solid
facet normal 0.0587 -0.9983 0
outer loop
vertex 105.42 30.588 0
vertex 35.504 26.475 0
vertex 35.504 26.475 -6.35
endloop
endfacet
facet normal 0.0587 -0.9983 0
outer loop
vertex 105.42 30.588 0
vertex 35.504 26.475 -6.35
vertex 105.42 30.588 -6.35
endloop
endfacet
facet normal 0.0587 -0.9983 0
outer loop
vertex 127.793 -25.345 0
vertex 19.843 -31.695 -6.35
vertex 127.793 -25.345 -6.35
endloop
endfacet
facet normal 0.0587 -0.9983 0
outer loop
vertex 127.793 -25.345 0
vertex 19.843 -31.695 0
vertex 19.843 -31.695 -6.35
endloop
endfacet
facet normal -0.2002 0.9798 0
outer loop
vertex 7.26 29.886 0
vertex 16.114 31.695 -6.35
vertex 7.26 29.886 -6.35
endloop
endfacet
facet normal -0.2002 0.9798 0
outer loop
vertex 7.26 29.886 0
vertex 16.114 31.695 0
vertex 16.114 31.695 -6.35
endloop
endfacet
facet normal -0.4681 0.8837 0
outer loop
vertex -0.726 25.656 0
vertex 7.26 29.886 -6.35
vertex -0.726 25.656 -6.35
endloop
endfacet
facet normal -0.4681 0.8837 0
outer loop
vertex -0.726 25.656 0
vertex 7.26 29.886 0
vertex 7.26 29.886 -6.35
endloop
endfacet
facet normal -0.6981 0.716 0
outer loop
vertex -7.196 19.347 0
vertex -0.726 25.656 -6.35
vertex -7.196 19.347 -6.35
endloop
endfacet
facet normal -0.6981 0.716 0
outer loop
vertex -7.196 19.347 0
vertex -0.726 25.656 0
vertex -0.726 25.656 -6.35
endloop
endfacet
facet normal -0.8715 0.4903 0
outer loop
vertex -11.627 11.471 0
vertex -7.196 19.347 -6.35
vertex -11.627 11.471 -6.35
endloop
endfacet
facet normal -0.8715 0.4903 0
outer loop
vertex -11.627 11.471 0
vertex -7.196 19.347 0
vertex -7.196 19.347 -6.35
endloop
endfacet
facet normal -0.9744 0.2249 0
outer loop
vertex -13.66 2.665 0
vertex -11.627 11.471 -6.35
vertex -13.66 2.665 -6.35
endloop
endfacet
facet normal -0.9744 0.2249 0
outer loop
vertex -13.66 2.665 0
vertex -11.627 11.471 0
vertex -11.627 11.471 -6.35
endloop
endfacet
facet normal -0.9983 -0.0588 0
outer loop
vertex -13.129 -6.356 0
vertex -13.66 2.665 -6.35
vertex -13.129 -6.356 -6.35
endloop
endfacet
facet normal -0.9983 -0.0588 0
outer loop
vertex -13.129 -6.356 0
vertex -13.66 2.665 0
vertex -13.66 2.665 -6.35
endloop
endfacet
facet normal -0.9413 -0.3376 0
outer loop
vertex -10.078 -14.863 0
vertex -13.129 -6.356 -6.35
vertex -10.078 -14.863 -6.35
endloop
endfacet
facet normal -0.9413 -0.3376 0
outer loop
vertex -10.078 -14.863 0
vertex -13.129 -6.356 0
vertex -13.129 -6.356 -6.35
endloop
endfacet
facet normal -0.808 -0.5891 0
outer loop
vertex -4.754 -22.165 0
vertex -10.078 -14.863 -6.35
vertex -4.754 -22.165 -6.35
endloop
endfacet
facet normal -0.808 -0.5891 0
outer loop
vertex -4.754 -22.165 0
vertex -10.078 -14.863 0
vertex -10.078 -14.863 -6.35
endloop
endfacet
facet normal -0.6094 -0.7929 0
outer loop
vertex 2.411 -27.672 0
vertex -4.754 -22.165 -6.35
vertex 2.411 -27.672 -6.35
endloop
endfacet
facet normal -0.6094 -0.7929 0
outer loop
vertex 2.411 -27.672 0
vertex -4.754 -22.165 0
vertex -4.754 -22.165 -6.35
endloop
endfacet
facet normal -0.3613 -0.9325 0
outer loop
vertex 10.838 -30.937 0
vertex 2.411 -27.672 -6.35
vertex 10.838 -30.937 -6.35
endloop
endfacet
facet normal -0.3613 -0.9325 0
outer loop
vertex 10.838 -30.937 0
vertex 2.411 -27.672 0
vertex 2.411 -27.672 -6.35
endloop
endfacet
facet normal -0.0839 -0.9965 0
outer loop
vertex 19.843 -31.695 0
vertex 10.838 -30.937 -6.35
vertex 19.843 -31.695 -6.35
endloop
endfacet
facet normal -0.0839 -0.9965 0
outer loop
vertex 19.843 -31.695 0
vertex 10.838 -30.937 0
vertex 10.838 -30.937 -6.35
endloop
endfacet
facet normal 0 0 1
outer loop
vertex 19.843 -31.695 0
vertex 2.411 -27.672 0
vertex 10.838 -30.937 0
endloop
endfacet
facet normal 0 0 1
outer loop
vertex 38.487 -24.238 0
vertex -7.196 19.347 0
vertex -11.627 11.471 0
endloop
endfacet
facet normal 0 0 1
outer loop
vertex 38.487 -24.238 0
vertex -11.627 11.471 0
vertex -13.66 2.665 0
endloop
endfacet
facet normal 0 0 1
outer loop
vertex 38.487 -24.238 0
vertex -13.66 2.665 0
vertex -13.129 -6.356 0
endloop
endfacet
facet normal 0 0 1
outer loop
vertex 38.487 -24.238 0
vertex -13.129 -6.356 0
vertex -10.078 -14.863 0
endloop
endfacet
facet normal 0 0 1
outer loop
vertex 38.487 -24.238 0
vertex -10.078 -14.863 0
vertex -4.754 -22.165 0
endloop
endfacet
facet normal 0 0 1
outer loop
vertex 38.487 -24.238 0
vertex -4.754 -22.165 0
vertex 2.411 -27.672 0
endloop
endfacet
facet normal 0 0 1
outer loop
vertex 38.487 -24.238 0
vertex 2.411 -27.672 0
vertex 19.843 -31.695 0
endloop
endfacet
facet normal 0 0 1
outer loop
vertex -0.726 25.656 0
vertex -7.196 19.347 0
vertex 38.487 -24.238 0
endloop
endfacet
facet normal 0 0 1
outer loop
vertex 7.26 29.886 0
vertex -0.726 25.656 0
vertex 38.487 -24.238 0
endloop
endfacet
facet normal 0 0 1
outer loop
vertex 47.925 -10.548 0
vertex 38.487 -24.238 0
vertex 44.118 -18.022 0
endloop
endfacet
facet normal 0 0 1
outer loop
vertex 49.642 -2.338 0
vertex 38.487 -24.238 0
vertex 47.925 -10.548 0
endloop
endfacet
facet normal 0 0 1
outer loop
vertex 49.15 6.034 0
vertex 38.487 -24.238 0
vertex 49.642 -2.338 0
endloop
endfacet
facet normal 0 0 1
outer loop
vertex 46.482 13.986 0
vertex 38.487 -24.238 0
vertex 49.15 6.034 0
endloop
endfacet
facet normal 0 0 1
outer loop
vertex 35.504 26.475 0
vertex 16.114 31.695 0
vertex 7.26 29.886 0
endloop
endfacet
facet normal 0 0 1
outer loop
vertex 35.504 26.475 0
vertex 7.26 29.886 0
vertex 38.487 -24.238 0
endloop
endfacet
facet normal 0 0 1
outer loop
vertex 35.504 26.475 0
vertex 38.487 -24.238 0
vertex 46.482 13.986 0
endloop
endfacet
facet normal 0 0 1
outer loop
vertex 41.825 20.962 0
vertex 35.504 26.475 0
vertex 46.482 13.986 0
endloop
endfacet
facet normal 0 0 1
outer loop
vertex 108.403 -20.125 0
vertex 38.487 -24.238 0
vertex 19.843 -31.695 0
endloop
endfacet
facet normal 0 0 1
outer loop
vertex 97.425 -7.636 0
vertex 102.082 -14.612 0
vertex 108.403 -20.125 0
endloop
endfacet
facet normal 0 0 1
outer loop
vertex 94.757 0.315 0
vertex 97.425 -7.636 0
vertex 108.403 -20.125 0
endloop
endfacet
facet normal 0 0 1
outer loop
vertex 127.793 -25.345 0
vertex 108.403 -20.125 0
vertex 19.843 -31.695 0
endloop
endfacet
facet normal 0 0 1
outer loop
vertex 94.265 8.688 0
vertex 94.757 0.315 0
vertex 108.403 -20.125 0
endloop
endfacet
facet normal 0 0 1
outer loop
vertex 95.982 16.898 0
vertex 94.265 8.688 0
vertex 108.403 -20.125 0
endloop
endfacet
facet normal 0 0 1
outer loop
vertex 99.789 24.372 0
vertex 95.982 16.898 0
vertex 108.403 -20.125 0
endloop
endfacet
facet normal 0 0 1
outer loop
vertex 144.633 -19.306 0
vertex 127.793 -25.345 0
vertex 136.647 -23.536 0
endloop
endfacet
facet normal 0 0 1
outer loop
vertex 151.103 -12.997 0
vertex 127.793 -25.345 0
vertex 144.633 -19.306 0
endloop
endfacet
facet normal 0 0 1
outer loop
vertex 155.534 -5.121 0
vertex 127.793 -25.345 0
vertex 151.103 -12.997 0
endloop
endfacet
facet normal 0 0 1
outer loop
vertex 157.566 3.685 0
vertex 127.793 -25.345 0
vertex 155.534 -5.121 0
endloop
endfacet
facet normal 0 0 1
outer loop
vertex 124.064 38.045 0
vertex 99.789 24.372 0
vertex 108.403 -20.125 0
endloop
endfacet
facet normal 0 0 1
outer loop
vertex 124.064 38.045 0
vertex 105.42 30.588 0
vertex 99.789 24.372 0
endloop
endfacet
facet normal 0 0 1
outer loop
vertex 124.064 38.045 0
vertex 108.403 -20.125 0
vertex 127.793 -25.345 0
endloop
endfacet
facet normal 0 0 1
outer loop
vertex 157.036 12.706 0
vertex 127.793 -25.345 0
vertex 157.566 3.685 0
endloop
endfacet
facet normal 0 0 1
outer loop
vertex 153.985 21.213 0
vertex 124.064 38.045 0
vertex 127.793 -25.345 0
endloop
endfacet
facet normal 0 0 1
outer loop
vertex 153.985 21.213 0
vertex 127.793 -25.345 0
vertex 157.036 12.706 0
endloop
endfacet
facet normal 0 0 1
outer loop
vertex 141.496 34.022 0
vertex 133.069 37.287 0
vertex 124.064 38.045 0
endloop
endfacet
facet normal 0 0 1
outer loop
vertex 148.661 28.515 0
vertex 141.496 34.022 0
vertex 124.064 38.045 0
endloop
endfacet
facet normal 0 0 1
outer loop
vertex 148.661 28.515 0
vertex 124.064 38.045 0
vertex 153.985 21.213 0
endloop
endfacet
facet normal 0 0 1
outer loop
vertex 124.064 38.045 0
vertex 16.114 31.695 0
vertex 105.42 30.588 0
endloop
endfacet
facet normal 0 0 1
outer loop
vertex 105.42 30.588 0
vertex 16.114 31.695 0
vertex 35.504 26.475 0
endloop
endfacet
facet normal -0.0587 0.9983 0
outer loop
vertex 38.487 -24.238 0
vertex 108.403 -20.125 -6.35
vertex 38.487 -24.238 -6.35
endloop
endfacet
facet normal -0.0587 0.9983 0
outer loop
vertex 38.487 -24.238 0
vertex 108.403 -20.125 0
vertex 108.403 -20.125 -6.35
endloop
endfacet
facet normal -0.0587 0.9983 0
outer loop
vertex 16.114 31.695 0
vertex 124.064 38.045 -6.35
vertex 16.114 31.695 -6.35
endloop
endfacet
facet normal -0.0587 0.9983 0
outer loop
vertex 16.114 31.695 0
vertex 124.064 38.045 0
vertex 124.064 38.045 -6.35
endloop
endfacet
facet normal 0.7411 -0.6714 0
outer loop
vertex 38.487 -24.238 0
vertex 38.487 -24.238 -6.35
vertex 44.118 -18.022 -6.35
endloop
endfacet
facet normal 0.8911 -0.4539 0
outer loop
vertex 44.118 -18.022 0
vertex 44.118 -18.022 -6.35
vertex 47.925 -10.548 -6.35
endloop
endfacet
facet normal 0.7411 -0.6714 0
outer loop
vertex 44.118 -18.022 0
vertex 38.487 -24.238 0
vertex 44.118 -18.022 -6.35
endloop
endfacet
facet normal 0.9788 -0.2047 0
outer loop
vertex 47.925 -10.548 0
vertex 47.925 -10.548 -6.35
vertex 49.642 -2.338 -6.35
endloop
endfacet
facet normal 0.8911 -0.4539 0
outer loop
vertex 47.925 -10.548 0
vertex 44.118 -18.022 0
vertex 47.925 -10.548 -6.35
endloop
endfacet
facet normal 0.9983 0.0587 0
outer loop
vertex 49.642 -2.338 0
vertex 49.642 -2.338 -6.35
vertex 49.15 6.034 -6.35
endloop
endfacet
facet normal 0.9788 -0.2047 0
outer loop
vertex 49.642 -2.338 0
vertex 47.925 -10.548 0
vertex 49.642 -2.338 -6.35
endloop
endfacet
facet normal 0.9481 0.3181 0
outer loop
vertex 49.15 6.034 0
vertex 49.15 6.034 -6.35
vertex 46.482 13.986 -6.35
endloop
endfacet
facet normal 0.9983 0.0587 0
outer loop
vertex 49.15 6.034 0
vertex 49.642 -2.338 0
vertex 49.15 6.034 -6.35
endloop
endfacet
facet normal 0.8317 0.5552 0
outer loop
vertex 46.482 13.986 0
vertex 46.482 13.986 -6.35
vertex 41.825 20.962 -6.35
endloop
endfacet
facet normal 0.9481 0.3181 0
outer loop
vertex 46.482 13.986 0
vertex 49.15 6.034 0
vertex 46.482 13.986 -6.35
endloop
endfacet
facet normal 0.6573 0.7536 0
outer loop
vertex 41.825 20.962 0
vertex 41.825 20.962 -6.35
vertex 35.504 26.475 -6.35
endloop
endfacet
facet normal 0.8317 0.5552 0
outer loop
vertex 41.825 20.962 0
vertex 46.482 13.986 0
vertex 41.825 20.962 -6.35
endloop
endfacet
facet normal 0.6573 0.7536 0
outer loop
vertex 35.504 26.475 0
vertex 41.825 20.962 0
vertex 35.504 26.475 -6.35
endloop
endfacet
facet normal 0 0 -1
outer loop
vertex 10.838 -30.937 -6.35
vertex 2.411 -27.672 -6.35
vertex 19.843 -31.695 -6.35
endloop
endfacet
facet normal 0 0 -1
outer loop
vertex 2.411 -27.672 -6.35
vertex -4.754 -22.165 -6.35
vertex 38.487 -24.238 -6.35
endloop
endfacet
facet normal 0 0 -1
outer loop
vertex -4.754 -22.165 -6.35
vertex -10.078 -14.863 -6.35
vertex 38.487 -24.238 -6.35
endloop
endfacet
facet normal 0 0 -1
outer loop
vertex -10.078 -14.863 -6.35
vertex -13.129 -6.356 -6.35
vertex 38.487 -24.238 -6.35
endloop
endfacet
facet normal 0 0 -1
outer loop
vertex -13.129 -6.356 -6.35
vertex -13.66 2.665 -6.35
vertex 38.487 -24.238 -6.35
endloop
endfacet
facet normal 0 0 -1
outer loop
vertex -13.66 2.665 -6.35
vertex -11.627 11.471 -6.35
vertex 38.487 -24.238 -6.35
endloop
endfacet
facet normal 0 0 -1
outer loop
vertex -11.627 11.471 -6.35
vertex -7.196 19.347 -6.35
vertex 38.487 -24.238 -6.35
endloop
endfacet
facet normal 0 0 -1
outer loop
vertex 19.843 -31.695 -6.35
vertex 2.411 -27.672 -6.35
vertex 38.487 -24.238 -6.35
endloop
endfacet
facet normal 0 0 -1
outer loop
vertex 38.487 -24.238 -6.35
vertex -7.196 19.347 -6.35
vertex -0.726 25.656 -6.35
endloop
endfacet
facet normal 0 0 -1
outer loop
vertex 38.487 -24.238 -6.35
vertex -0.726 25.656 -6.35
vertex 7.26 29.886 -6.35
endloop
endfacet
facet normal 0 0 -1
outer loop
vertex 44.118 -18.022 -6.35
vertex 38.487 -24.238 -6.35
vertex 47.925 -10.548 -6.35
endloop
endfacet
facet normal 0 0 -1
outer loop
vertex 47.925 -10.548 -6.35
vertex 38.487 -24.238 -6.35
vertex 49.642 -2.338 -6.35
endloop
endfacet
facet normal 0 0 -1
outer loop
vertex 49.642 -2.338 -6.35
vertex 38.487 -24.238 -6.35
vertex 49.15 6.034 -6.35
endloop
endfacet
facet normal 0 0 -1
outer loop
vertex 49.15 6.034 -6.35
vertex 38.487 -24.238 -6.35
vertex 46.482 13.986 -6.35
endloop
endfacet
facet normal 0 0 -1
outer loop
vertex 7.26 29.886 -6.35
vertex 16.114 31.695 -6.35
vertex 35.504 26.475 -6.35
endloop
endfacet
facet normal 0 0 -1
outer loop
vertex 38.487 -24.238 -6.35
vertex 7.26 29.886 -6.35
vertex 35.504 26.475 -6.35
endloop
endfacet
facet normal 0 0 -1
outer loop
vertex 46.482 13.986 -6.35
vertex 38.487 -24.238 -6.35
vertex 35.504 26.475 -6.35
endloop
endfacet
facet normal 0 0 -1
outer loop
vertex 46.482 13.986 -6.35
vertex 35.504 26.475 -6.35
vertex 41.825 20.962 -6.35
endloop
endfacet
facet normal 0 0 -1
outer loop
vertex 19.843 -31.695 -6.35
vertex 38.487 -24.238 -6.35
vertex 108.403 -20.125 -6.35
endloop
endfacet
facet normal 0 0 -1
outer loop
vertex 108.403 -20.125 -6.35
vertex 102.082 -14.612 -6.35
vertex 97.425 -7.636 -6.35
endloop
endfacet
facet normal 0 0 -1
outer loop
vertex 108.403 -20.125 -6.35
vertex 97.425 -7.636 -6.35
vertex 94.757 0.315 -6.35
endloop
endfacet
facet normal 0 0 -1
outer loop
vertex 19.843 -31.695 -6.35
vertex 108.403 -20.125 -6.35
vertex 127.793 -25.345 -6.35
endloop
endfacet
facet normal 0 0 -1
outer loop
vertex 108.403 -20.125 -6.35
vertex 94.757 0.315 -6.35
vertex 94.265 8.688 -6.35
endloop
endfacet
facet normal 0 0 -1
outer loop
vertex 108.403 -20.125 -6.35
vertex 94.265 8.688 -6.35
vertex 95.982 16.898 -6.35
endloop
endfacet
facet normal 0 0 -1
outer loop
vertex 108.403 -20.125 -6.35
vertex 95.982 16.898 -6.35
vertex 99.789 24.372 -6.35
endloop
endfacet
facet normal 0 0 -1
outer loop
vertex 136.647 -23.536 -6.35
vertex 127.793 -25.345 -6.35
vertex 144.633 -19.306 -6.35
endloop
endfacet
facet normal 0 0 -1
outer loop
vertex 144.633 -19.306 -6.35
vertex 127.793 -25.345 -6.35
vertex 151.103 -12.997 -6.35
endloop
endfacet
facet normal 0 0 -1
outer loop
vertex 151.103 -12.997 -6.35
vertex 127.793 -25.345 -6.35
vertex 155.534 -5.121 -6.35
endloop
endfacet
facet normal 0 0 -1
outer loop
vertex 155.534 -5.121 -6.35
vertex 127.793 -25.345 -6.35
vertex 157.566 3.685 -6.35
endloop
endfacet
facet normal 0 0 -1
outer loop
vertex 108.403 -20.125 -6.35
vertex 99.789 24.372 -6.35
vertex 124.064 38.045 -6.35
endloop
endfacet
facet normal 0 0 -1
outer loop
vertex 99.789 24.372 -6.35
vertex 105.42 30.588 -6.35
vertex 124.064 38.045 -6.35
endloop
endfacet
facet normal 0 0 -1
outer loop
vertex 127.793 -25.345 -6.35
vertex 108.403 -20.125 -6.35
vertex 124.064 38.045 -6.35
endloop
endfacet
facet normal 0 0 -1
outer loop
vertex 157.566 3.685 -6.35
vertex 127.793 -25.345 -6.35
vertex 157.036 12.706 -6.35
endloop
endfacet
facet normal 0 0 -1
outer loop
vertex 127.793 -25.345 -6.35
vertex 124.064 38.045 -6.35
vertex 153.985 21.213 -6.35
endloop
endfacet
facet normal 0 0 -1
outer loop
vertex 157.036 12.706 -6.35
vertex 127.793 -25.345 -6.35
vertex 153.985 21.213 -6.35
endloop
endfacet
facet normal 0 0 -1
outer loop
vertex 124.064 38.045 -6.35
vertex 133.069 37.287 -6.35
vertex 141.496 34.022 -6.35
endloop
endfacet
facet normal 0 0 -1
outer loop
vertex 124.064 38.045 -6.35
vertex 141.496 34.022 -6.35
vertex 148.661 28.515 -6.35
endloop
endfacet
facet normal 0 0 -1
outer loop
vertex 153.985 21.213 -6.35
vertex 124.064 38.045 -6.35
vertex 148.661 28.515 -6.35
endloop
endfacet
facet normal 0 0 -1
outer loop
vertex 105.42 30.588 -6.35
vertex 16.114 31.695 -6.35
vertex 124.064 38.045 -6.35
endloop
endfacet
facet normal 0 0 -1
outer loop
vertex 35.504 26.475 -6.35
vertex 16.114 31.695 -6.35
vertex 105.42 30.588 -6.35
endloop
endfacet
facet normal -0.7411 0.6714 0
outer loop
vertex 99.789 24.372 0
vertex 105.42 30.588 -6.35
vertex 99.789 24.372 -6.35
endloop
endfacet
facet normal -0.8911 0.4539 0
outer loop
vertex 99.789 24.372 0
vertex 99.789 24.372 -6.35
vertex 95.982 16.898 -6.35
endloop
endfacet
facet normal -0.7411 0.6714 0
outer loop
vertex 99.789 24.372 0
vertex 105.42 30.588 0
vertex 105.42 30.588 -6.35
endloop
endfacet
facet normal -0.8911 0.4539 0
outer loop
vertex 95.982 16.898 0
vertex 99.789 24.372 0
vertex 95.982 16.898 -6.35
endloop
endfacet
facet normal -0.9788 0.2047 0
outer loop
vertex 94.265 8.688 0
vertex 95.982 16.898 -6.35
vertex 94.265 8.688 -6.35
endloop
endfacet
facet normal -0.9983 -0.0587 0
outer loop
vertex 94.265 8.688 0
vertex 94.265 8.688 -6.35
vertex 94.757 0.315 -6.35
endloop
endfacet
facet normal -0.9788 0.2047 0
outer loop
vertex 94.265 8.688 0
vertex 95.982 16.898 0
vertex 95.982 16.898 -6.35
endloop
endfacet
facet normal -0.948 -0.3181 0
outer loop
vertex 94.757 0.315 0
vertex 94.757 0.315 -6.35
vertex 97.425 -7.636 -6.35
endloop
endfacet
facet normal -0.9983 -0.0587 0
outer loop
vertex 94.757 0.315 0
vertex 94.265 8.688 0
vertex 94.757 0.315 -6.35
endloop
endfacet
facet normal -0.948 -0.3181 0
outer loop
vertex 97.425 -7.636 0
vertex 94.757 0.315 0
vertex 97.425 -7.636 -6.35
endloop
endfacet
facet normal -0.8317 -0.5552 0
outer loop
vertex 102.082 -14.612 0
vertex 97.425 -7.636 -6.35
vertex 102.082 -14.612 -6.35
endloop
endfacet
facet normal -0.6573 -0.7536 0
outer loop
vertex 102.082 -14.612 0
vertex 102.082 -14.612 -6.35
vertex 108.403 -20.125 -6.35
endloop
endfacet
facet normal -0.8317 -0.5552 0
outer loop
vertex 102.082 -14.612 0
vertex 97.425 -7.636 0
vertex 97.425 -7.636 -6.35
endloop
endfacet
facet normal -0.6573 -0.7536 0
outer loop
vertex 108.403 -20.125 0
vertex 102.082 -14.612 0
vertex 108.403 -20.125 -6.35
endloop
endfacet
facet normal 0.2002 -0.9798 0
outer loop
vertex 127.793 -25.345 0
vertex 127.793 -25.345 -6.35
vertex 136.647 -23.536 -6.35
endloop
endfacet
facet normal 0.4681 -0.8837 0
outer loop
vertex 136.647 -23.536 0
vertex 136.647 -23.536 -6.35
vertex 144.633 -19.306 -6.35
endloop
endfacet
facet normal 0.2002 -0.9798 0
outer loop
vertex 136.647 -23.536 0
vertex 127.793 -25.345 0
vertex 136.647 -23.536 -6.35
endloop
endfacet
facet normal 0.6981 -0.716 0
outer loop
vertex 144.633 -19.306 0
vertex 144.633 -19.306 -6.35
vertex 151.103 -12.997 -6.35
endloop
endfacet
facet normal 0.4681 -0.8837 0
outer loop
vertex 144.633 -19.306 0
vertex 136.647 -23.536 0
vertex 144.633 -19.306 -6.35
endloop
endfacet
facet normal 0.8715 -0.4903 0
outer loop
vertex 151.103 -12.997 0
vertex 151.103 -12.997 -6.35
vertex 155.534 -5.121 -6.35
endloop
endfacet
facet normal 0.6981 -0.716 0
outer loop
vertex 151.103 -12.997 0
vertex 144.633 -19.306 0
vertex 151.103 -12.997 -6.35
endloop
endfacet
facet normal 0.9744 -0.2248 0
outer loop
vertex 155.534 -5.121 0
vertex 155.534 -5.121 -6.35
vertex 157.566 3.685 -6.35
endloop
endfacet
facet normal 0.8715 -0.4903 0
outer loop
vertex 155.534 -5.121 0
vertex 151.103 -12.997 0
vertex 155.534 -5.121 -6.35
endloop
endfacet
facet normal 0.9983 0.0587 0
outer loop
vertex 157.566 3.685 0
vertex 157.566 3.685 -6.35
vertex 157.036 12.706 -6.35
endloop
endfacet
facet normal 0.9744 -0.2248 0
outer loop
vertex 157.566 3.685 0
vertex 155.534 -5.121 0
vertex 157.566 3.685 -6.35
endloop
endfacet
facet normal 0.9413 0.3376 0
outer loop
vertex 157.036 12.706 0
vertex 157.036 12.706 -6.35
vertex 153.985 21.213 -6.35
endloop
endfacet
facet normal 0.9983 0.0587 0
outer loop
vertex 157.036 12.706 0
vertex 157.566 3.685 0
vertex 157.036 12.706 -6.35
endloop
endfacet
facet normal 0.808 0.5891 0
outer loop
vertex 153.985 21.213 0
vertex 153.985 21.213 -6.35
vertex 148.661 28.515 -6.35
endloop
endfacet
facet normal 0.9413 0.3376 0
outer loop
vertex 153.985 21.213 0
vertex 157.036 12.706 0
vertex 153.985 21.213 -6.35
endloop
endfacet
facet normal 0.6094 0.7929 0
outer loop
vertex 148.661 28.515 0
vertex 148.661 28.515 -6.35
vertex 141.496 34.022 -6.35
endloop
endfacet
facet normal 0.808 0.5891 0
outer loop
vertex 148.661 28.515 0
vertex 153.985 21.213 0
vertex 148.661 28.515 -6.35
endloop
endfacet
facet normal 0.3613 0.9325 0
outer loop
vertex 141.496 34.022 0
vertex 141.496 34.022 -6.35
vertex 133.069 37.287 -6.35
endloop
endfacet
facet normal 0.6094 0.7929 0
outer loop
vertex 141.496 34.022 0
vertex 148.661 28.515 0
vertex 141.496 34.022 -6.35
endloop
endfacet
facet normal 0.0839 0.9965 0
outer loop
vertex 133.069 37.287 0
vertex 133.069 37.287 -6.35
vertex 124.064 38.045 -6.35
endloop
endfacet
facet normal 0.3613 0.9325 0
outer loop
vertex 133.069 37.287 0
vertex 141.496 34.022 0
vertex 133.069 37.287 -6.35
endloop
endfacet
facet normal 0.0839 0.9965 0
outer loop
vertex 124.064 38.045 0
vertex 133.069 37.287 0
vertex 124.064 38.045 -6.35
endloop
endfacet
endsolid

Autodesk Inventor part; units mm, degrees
ref_plane "YZ Plane" through (0, 0, 0) normal (1, 0, 0) x (0, 1, 0)
ref_plane "XZ Plane" through (0, 0, 0) normal (0, 1, 0) x (-1, 0, 0)
ref_plane "XY Plane" through (0, 0, 0) normal (0, 0, 1) x (1, 0, 0)
sketch "Sketch1" plane through (0, 0, 0) normal (0, 0, 1) x (1, 0, 0)
  circle A0 centre (17.9784, 0) radius 31.75
  circle A1 centre (125.9284, 6.35) radius 31.75
  line L0 (124.0639, 38.0452) -> (16.1139, 31.6952)
  line L1 (19.8428, -31.6952) -> (127.7928, -25.3452)
  line L2 (35.504, 26.4748) -> (105.4197, 30.5875)
  line L3 (108.4028, -20.1248) -> (38.487, -24.2375)
  line L4 (35.504, 26.4748) -> (16.1139, 31.6952)
  line L5 (38.487, -24.2375) -> (17.9784, -31.75)
  line L6 (108.4028, -20.1248) -> (127.7928, -25.3452)
  line L7 (105.4197, 30.5875) -> (124.0639, 38.0452)
  point P0 (0, 0)
  dimension "d0" = 107.95
  dimension "d1" = 6.35
  dimension "d2" = 63.5
  dimension "d3" = 63.5
  dimension "d4" = 6.35
  dimension "d5" = 6.35
extrude "Extrusion1" add sketch "Sketch1" against normal blind 6.35 contours A0 L5 L4 | L4 A0 | A0 L0 A1 L2 | L3 A1 L1 A0 | A0 L5 | L7 A1 L6 | A1 L7 | L6 A1
properties part number "shooterchain"
